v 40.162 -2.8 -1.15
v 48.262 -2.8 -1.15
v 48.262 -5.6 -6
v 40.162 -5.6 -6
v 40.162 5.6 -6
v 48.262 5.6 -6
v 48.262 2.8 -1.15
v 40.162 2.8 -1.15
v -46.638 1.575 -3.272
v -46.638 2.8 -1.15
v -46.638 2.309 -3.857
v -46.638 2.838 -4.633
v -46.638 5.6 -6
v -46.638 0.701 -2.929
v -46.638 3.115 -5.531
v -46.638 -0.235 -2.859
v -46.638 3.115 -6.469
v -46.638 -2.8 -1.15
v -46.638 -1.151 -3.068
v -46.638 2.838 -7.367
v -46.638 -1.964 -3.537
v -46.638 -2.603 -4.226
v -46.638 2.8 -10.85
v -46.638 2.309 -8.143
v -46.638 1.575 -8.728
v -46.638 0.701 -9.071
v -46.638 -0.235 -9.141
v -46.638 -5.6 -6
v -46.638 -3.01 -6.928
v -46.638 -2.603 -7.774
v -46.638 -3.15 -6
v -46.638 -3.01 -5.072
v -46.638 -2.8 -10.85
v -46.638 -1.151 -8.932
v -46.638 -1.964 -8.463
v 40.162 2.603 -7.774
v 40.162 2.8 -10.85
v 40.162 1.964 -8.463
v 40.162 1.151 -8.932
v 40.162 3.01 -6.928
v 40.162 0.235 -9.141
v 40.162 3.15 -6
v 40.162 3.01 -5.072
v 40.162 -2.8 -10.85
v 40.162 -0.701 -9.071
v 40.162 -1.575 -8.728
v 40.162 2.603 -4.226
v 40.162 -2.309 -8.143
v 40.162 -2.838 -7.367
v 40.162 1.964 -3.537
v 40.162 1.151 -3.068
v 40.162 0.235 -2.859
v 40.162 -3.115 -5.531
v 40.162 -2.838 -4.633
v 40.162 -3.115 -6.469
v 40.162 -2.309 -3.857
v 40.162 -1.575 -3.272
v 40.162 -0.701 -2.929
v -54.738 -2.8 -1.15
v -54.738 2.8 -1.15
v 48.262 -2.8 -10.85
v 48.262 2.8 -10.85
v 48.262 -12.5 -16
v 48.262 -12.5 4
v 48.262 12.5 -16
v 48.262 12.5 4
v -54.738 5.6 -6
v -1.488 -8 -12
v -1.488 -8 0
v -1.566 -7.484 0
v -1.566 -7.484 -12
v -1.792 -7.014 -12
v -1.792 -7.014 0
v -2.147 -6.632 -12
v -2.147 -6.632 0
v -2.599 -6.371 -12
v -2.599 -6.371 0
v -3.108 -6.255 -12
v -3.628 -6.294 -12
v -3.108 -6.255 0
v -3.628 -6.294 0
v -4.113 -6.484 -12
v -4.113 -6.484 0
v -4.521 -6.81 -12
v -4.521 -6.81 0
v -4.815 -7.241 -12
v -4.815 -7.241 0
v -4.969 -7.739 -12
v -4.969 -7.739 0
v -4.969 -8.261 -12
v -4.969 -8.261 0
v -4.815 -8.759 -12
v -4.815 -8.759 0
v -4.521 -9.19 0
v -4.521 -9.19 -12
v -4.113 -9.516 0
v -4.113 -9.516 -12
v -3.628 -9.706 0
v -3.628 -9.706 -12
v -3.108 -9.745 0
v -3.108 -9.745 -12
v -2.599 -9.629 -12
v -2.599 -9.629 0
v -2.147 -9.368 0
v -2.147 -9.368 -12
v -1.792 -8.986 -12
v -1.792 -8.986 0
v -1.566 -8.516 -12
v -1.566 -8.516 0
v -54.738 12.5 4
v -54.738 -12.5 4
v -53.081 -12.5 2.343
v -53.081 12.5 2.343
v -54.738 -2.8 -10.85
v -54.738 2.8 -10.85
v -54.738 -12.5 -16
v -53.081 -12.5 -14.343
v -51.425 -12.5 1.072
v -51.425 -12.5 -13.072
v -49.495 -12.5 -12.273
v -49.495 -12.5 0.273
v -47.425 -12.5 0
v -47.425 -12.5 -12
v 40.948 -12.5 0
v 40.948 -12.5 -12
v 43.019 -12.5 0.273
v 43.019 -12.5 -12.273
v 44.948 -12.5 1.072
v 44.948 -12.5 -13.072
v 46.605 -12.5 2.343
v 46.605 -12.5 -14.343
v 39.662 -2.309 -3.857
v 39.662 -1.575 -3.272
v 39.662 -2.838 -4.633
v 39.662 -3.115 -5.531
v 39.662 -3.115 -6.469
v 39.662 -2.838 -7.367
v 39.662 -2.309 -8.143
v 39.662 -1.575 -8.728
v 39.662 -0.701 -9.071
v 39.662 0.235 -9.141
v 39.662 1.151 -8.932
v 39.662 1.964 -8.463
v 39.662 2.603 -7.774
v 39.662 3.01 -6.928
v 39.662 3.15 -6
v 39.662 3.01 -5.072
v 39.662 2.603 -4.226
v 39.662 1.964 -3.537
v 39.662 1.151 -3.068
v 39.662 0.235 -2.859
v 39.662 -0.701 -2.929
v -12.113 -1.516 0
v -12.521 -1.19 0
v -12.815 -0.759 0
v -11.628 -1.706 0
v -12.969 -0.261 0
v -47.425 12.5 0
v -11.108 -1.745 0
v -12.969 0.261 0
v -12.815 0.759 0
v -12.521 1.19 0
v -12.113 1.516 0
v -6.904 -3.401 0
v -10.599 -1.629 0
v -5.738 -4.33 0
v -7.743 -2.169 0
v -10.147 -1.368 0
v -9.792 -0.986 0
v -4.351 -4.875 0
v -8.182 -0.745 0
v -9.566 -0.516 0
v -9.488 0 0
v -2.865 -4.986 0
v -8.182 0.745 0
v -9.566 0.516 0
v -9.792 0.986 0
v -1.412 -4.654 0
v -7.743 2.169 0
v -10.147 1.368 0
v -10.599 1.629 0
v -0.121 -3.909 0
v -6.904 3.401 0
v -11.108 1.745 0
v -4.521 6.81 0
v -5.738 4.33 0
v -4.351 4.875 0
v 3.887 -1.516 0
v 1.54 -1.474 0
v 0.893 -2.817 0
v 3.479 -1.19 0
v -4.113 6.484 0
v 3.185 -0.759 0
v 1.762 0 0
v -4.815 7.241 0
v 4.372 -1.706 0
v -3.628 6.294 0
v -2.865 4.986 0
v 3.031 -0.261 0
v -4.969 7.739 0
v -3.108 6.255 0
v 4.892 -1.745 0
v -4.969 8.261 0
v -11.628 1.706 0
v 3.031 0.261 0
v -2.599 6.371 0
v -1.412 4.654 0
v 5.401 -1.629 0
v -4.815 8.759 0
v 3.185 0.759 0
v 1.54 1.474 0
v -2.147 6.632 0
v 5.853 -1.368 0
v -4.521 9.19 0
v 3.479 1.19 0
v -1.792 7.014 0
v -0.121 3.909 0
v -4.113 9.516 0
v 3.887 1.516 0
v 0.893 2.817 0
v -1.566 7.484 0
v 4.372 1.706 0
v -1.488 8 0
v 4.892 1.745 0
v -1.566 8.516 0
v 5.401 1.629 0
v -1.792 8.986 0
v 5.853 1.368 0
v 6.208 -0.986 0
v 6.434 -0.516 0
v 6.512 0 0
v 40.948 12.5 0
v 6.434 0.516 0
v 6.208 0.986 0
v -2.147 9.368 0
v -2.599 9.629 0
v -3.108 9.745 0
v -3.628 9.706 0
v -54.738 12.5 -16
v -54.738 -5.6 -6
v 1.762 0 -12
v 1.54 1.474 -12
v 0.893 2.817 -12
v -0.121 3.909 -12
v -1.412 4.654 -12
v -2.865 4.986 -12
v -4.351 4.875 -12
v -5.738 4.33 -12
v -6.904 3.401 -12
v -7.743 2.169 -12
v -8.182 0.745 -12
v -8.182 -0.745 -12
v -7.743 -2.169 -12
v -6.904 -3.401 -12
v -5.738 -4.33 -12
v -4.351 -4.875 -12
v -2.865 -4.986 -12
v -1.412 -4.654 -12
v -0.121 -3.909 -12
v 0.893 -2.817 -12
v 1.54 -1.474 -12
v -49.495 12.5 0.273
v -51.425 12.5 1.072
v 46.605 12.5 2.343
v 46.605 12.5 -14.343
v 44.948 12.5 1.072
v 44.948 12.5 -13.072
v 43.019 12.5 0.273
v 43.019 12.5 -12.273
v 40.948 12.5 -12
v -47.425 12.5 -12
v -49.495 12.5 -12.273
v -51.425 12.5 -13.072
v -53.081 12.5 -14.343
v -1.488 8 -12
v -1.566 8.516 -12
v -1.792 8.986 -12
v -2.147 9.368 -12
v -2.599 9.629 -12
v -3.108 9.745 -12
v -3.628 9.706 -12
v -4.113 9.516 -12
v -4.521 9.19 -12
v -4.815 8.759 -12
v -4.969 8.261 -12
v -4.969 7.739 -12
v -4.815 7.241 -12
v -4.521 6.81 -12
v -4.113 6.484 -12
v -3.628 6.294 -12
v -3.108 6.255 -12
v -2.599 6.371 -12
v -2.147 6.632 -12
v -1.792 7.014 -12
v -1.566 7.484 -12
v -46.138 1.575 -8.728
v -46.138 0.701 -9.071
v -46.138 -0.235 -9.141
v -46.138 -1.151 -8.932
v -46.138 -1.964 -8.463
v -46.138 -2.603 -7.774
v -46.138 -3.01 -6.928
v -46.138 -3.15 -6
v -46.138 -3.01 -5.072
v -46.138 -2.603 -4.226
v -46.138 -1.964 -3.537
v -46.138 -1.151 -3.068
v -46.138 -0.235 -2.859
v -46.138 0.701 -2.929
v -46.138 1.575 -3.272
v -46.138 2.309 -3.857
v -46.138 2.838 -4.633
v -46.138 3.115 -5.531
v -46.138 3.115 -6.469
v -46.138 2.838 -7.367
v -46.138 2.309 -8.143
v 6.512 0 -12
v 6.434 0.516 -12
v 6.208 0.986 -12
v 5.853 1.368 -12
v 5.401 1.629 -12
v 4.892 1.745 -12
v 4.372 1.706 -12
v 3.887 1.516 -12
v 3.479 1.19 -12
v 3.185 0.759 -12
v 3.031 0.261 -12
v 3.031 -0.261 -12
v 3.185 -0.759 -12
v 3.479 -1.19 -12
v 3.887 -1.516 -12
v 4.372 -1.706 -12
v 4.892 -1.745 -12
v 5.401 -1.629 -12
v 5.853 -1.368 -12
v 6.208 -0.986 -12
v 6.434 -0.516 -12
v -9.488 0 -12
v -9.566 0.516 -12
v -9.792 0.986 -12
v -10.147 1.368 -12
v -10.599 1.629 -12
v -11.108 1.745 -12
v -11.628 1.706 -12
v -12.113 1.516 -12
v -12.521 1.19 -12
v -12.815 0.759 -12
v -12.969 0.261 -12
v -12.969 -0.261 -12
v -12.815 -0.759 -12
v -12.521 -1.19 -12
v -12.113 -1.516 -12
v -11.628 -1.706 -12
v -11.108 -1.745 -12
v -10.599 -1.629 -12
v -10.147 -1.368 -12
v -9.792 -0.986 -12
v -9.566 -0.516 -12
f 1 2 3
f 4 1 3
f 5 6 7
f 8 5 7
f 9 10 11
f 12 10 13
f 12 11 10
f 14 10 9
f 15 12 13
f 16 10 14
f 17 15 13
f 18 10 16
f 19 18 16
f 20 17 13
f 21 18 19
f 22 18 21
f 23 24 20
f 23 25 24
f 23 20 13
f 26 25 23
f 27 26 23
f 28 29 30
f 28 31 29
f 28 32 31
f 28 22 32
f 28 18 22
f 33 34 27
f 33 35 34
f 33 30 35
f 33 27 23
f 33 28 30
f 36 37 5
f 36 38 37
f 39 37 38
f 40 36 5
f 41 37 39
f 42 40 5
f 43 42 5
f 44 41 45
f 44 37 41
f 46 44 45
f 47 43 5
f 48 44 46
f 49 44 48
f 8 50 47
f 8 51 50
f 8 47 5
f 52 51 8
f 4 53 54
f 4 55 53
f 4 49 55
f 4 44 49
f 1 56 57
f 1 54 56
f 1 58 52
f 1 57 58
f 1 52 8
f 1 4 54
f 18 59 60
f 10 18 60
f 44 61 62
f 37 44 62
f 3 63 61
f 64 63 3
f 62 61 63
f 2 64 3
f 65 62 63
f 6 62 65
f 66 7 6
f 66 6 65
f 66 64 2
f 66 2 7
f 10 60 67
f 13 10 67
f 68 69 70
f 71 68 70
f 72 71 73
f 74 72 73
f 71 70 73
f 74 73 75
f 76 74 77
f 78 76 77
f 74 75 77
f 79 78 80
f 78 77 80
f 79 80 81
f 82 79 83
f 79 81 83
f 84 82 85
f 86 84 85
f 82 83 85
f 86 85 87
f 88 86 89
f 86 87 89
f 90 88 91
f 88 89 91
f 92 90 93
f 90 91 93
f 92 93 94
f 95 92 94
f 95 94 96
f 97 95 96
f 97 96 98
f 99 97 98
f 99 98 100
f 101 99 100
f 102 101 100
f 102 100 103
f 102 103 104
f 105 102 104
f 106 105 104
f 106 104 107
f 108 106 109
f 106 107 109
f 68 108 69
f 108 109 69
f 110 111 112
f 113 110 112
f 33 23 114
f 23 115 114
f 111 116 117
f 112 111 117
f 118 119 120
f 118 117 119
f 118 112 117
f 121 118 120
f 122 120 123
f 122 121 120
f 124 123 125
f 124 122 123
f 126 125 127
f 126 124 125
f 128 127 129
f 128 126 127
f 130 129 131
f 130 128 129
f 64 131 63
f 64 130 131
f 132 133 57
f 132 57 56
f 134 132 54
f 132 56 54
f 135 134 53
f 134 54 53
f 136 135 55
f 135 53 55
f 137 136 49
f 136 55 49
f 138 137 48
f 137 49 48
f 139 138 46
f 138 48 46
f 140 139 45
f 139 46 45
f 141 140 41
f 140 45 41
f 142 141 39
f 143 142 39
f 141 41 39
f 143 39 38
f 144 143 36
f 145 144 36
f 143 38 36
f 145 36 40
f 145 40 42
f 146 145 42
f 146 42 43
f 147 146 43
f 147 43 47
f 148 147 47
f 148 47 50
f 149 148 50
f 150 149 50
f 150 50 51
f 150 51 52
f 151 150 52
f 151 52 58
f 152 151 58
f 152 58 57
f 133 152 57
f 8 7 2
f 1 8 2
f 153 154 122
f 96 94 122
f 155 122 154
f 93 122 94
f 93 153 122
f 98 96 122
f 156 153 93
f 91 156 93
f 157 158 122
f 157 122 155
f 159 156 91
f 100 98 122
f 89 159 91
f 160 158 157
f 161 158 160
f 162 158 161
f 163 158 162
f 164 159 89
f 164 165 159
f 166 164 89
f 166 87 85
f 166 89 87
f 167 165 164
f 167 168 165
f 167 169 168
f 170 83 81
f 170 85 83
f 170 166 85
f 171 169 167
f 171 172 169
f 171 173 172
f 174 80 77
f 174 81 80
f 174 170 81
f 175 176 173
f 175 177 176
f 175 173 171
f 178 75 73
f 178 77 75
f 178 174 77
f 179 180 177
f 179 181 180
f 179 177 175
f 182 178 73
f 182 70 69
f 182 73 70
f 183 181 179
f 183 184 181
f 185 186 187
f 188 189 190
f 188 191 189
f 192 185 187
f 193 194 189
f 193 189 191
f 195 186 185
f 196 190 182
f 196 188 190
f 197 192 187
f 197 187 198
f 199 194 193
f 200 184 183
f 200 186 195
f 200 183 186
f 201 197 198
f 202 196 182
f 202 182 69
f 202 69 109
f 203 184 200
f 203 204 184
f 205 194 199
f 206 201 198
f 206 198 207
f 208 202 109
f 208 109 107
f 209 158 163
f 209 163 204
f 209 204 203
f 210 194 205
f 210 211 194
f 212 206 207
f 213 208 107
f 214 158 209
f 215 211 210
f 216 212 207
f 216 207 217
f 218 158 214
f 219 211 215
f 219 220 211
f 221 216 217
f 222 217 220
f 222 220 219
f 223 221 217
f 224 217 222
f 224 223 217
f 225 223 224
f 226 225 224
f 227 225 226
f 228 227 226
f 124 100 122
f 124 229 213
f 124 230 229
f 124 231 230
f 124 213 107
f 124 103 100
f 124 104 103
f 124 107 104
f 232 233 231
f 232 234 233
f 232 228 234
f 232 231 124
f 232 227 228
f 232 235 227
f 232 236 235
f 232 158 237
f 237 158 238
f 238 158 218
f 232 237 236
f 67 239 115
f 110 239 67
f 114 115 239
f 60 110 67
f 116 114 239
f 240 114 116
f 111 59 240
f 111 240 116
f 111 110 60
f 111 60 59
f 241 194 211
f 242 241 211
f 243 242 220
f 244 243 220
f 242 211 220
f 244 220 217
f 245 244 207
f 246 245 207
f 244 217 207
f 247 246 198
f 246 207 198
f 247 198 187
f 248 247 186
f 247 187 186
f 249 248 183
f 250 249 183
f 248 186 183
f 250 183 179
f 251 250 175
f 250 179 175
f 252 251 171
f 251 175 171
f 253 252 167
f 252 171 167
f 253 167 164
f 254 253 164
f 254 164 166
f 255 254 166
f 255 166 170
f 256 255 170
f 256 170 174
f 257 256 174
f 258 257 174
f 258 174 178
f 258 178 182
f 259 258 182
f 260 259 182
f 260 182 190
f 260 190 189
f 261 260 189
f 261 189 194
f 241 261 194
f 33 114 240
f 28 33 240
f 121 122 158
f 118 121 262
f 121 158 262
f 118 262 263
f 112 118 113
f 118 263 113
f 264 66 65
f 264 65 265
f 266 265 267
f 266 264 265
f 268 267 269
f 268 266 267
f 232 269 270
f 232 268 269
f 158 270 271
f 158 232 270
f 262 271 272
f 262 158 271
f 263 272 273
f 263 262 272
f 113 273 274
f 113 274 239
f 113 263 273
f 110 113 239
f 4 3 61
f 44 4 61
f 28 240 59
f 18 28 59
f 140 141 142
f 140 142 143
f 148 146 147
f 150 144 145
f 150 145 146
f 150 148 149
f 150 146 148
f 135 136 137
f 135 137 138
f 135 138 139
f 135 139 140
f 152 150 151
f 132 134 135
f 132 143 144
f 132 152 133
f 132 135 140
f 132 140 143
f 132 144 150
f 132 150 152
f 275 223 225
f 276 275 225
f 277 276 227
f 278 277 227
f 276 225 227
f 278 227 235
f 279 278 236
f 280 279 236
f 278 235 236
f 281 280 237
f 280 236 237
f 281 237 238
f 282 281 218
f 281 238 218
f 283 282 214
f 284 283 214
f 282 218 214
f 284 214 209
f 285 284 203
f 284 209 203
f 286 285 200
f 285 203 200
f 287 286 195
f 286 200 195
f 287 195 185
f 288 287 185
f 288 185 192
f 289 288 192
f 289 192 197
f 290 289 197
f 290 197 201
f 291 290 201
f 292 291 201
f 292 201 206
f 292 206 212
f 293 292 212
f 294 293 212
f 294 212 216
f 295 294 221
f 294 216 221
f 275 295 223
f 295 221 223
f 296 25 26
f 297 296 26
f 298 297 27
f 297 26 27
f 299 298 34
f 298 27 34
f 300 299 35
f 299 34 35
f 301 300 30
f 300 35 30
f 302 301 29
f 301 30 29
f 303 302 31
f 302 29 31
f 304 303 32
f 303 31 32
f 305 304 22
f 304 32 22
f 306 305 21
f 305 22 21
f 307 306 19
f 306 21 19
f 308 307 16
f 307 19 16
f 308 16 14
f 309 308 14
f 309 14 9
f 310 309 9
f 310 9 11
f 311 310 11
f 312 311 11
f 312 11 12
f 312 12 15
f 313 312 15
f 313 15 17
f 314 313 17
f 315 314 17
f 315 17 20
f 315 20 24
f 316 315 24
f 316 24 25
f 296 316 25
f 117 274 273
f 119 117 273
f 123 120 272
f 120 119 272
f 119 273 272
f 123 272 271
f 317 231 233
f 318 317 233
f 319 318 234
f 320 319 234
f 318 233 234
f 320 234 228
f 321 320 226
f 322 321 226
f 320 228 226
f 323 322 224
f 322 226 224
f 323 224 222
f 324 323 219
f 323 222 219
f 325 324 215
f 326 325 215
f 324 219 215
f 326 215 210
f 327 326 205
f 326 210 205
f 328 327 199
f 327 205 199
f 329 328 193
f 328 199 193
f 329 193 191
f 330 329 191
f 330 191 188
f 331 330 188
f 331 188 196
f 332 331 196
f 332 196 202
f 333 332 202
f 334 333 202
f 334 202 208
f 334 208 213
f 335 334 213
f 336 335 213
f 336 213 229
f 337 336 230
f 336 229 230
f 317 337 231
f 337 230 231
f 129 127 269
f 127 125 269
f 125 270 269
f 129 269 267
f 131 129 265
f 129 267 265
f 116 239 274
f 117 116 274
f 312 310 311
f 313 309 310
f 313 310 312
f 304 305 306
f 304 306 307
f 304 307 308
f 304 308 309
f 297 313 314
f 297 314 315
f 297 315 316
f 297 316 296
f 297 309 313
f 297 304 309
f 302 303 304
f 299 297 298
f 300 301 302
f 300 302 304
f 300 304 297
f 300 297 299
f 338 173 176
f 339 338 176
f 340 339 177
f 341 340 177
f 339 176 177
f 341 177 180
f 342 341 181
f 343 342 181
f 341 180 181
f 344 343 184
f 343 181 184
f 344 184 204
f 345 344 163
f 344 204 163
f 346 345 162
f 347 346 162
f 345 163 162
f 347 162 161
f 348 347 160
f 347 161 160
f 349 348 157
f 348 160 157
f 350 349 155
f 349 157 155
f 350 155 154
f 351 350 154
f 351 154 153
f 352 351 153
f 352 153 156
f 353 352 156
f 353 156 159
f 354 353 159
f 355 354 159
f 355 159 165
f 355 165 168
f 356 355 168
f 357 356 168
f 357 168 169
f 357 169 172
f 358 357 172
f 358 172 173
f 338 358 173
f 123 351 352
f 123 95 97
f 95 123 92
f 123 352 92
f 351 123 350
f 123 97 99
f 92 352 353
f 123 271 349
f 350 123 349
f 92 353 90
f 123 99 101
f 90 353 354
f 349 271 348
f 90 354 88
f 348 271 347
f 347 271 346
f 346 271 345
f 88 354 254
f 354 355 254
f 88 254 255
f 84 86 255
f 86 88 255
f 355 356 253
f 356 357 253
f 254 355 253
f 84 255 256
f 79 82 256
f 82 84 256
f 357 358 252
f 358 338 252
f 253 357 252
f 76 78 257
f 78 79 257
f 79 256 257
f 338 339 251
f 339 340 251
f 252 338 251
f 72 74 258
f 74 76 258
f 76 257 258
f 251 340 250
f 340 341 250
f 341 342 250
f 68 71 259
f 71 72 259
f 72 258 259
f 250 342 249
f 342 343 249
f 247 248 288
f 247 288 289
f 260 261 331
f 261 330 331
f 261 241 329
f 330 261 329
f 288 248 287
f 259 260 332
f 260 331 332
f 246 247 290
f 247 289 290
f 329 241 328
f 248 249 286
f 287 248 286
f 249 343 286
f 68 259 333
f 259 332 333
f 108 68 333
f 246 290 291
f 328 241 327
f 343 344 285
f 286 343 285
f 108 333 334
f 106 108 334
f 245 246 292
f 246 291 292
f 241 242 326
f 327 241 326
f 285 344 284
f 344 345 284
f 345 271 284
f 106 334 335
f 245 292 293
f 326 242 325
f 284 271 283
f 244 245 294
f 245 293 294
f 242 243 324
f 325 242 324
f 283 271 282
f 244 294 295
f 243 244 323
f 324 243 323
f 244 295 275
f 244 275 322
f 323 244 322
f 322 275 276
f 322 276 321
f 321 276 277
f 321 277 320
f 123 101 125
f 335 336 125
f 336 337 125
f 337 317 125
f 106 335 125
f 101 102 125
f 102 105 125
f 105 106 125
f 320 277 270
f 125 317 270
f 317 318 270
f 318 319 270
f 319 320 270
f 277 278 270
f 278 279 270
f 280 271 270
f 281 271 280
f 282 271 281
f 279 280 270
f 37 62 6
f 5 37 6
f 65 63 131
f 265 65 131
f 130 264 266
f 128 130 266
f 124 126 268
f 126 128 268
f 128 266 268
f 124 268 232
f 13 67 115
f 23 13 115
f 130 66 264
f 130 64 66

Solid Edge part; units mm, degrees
sketch "Sketch1" plane through (0, 0, 0) normal (0, 0, 1) x (1, 0, 0)
  line L0 (48.2617, 12.5) -> (-54.7383, 12.5)
  line L1 (-54.7383, 12.5) -> (-54.7383, -12.5)
  line L2 (-54.7383, -12.5) -> (48.2617, -12.5)
  line L3 (48.2617, -12.5) -> (48.2617, 12.5)
  circle A0 centre (-11.2383, 0) radius 1.75
  circle A1 centre (-3.2383, -8) radius 1.75
  circle A2 centre (4.7617, 0) radius 1.75
  circle A3 centre (-3.2383, 0) radius 5
  circle A4 centre (-3.2383, 8) radius 1.75
  dimension "D1" = 103
  dimension "D2" = 25
  dimension "D3" = 3.5
  dimension "D4" = 10
  dimension "D5" = 51.5
  dimension "D6" = 8
  dimension "D7" = 8
  dimension "D8" = 8
  dimension "D9" = 8
  dimension "D10" = 51.5
extrude "Protrusion1" add sketch "Sketch1" against normal blind 12
sketch "Sketch2" plane through (-54.7383, 0, -6) normal (-1, 0, 0) x (0, 0, -1)
  line L0 (4.85, 2.8001) -> (0, 5.6003)
  line L1 (0, 5.6003) -> (-4.85, 2.8001)
  line L2 (-4.85, 2.8001) -> (-4.85, -2.8001)
  line L3 (-4.85, -2.8001) -> (0, -5.6003)
  line L4 (0, -5.6003) -> (4.85, -2.8001)
  line L5 (4.85, -2.8001) -> (4.85, 2.8001)
extrude "ExtrudedCutout_2" cut sketch "Sketch2" against normal blind 8.1
sketch "Sketch3" plane through (48.2617, 0, -6) normal (1, 0, 0) x (0, 0, 1)
  line L0 (4.85, 2.8001) -> (0, 5.6003)
  line L1 (0, 5.6003) -> (-4.85, 2.8001)
  line L2 (-4.85, 2.8001) -> (-4.85, -2.8001)
  line L3 (-4.85, -2.8001) -> (0, -5.6003)
  line L4 (0, -5.6003) -> (4.85, -2.8001)
  line L5 (4.85, -2.8001) -> (4.85, 2.8001)
extrude "ExtrudedCutout_3" cut sketch "Sketch3" against normal blind 8.1
sketch "Sketch4" plane through (-4.7383, -12.5, -6) normal (0, -1, 0) x (-1, 0, 0)
  line L0 (-53, 10) -> (-49, 6)
  line L1 (-53, 6) -> (-49, 6)
  line L2 (-53, 6) -> (-53, 10)
  line L3 (-53, -6) -> (-53, -10)
  line L4 (-53, -10) -> (-49, -6)
  line L5 (-53, -6) -> (-49, -6)
  line L6 (50, 10) -> (46, 6)
  line L7 (46, 6) -> (50, 6)
  line L8 (50, 6) -> (50, 10)
  line L9 (50, -10) -> (46, -6)
  line L10 (50, -6) -> (46, -6)
  line L11 (50, -6) -> (50, -10)
  dimension "D1" = 4
  dimension "D2" = 5.6569
  dimension "D3" = 4
  dimension "D4" = 5.6569
  dimension "D5" = 4
  dimension "D6" = 5.6569
  dimension "D7" = 4
extrude "ExtrudedProtrusion_8" add sketch "Sketch4" against normal blind 25
sketch "Sketch5" plane through (40.1617, 0, -6) normal (1, 0, 0) x (0, -0.5, 0.866)
  circle A0 centre (0, 0) radius 3.15
extrude "ExtrudedCutout_4" cut sketch "Sketch5" against normal blind 0.5
sketch "Sketch6" plane through (-46.6383, 0, -6) normal (-1, 0, 0) x (0, 0.5, -0.866)
  circle A0 centre (0, 0) radius 3.15
extrude "ExtrudedCutout_5" cut sketch "Sketch6" against normal blind 0.5
fillet "Round_2" radius 8 4 edges at (44.2617, 0, 0) (44.2617, 0, -12) (-50.7383, 0, -12) (-50.7383, 0, 0)
